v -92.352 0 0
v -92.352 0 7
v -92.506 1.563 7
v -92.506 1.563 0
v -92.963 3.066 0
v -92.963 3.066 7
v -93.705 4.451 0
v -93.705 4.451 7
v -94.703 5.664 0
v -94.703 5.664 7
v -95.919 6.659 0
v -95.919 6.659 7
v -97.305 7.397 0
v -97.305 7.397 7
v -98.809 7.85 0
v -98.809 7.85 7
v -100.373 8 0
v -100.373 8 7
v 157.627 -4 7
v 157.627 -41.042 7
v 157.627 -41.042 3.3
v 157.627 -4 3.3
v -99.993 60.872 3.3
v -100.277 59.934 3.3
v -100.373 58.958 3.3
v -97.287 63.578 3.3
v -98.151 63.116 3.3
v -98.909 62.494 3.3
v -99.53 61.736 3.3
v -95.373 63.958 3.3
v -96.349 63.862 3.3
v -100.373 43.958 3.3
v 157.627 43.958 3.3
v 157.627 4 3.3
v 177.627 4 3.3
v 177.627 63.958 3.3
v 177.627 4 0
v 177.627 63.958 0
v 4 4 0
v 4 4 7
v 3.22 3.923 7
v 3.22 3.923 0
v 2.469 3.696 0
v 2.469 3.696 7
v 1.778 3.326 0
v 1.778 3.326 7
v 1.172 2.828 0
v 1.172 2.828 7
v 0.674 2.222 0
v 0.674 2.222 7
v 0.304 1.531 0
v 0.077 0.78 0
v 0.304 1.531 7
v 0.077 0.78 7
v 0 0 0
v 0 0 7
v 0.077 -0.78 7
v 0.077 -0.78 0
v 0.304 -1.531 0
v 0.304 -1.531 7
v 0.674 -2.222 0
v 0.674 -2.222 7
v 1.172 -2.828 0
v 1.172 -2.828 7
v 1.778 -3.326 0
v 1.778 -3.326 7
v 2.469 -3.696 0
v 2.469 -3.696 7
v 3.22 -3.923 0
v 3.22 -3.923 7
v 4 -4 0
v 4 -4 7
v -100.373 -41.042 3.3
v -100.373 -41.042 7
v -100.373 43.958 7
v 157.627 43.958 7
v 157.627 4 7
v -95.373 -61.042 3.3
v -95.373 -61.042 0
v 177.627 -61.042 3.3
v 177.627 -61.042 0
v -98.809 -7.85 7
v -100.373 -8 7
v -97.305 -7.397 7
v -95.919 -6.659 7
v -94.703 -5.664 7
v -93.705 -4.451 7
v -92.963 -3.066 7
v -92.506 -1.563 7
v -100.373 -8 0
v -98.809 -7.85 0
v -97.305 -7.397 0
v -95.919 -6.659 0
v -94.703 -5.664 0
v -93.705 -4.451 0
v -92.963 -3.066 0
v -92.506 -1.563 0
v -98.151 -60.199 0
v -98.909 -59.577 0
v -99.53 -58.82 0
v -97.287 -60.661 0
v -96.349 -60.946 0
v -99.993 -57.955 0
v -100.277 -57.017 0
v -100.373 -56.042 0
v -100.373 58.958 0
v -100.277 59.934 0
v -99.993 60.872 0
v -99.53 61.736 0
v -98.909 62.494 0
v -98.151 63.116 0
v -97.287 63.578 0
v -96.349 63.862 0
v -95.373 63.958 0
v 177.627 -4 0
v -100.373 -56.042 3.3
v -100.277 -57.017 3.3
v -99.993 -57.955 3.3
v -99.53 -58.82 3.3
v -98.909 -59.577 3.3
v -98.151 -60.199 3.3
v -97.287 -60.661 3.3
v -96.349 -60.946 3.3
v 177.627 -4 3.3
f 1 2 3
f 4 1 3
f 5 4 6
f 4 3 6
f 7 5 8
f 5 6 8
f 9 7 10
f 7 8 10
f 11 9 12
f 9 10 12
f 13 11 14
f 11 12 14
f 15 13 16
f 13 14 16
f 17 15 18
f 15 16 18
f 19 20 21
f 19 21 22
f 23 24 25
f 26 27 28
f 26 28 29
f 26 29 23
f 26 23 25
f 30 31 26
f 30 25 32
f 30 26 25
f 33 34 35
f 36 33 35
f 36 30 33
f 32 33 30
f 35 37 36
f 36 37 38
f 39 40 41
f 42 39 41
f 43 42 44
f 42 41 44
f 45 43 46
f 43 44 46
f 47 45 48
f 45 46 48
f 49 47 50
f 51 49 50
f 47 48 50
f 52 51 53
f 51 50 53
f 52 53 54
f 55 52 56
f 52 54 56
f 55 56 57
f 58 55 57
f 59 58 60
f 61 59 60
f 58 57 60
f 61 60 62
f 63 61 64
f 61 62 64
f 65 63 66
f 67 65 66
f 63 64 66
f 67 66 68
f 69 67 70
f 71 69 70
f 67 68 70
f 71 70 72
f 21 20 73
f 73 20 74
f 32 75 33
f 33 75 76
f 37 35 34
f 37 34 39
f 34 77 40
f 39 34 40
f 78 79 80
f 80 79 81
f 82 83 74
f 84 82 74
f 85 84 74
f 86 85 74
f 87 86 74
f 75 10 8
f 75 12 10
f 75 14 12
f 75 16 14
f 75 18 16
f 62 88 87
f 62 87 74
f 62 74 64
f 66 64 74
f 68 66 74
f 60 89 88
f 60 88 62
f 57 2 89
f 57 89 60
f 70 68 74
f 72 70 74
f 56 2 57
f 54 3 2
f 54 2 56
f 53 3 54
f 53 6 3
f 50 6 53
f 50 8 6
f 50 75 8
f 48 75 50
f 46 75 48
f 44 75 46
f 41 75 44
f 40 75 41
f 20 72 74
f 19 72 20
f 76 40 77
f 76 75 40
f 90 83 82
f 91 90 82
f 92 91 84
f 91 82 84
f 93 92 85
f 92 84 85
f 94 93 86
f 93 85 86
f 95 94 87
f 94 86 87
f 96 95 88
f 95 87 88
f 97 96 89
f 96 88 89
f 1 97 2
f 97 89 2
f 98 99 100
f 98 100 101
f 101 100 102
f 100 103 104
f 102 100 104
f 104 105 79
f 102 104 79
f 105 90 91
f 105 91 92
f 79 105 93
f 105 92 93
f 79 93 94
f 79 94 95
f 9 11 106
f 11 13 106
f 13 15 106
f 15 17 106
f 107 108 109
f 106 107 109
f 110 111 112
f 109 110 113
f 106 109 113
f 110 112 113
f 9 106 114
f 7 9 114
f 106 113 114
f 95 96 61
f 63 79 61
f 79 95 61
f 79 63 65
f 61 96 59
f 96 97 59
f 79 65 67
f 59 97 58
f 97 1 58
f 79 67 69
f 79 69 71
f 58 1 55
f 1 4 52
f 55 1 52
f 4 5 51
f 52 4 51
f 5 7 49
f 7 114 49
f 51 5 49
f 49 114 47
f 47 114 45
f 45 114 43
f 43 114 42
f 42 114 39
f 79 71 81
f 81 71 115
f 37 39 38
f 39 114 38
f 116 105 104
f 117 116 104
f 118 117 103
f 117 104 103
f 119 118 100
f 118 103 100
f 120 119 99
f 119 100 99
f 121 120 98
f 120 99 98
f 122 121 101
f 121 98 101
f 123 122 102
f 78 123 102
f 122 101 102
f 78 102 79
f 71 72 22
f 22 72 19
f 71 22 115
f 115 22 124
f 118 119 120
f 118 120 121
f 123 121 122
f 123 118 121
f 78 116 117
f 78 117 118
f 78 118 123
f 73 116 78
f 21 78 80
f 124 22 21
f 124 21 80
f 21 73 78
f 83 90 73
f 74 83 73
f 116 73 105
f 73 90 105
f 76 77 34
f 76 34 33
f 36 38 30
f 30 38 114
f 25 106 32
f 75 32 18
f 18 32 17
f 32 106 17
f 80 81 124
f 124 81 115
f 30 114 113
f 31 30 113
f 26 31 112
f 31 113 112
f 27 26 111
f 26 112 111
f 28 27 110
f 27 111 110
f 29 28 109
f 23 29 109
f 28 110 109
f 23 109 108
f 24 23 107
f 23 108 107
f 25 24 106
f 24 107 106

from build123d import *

# Parameters (mm, degrees)
F1_DEPTH  = 7
F3_DEPTH  = 25
F5_DEPTH  = 25
F7_DEPTH  = 25
F8_W      = 20
F8_H      = 59.9582853711
F8_H_2    = 57.0417146289
F9_DEPTH  = 3.7
F11_DEPTH = 3.7


with BuildPart() as f1:
    # F0 (on Top) → F1 (new body)
    with BuildSketch(Plane.XY):
        with BuildLine():
            Line((177.6268834546, 63.9582853711), (-95.3731165454, 63.9582853711))
            ThreePointArc((-95.3731165454, 63.9582853711), (-98.9086504513, 62.493819277), (-100.3731165454, 58.9582853711))
            Line((-100.3731165454, 58.9582853711), (-100.3731165454, -56.0417146289))
            ThreePointArc((-100.3731165454, -56.0417146289), (-98.9086504513, -59.5772485349), (-95.3731165454, -61.0417146289))
            Line((-95.3731165454, -61.0417146289), (177.6268834546, -61.0417146289))
            Line((177.6268834546, -61.0417146289), (177.6268834546, 63.9582853711))
        make_face()
    extrude(amount=F1_DEPTH)

    # F2 (on face) → F3 (cut)
    with BuildSketch(Plane.XY.offset(7)):
        with BuildLine():
            Line((177.6268834546, -4), (177.6268834546, 0))
            Line((177.6268834546, 0), (0, 0))
            ThreePointArc((0, 0), (1.1715728753, -2.8284271247), (4, -4))
            Line((4, -4), (177.6268834546, -4))
        make_face()
    extrude(amount=-F3_DEPTH, mode=Mode.SUBTRACT)

    # F4 (on face) → F5 (cut)
    with BuildSketch(Plane.XY.offset(7)):
        with BuildLine():
            ThreePointArc((4, 4), (1.1715728753, 2.8284271247), (0, 0))
            Line((0, 0), (177.6268834546, 0))
            Line((177.6268834546, 0), (177.6268834546, 4))
            Line((177.6268834546, 4), (4, 4))
        make_face()
    extrude(amount=-F5_DEPTH, mode=Mode.SUBTRACT)

    # F6 (on face) → F7 (cut)
    with BuildSketch(Plane.XY.offset(7)):
        with BuildLine():
            ThreePointArc((-100.3731165454, -7.9999726506), (-94.7027443402, -5.6642452842), (-92.3521978855, 0))
            ThreePointArc((-92.3521978855, 0), (-94.7027443402, 5.6642452842), (-100.3731165454, 7.9999726506))
            Line((-100.3731165454, 7.9999726506), (-100.3731165454, -7.9999726506))
        make_face()
    extrude(amount=-F7_DEPTH, mode=Mode.SUBTRACT)

    # F8 (on face) → F9 (cut)
    with BuildSketch(Plane.XY.offset(7)):
        with Locations((167.6268834546, 33.9791426855)):
            Rectangle(F8_W, F8_H)
        with Locations((167.6268834546, -32.5208573145)):
            Rectangle(F8_W, F8_H_2)
    extrude(amount=-F9_DEPTH, mode=Mode.SUBTRACT)

    # F10 (on face) → F11 (cut)
    with BuildSketch(Plane.XY.offset(7)):
        with BuildLine():
            Line((157.6268834546, 43.9582853711), (157.6268834546, 63.9582853711))
            Line((157.6268834546, 63.9582853711), (-95.3731165454, 63.9582853711))
            ThreePointArc((-95.3731165454, 63.9582853711), (-98.9086504513, 62.493819277), (-100.3731165454, 58.9582853711))
            Line((-100.3731165454, 58.9582853711), (-100.3731165454, 43.9582853711))
            Line((-100.3731165454, 43.9582853711), (157.6268834546, 43.9582853711))
        make_face()
        with BuildLine():
            Line((157.6268834546, -41.0417146289), (-100.3731165454, -41.0417146289))
            Line((-100.3731165454, -41.0417146289), (-100.3731165454, -56.0417146289))
            ThreePointArc((-100.3731165454, -56.0417146289), (-98.9086504513, -59.5772485349), (-95.3731165454, -61.0417146289))
            Line((-95.3731165454, -61.0417146289), (157.6268834546, -61.0417146289))
            Line((157.6268834546, -61.0417146289), (157.6268834546, -41.0417146289))
        make_face()
    extrude(amount=-F11_DEPTH, mode=Mode.SUBTRACT)


solid = f1.part
